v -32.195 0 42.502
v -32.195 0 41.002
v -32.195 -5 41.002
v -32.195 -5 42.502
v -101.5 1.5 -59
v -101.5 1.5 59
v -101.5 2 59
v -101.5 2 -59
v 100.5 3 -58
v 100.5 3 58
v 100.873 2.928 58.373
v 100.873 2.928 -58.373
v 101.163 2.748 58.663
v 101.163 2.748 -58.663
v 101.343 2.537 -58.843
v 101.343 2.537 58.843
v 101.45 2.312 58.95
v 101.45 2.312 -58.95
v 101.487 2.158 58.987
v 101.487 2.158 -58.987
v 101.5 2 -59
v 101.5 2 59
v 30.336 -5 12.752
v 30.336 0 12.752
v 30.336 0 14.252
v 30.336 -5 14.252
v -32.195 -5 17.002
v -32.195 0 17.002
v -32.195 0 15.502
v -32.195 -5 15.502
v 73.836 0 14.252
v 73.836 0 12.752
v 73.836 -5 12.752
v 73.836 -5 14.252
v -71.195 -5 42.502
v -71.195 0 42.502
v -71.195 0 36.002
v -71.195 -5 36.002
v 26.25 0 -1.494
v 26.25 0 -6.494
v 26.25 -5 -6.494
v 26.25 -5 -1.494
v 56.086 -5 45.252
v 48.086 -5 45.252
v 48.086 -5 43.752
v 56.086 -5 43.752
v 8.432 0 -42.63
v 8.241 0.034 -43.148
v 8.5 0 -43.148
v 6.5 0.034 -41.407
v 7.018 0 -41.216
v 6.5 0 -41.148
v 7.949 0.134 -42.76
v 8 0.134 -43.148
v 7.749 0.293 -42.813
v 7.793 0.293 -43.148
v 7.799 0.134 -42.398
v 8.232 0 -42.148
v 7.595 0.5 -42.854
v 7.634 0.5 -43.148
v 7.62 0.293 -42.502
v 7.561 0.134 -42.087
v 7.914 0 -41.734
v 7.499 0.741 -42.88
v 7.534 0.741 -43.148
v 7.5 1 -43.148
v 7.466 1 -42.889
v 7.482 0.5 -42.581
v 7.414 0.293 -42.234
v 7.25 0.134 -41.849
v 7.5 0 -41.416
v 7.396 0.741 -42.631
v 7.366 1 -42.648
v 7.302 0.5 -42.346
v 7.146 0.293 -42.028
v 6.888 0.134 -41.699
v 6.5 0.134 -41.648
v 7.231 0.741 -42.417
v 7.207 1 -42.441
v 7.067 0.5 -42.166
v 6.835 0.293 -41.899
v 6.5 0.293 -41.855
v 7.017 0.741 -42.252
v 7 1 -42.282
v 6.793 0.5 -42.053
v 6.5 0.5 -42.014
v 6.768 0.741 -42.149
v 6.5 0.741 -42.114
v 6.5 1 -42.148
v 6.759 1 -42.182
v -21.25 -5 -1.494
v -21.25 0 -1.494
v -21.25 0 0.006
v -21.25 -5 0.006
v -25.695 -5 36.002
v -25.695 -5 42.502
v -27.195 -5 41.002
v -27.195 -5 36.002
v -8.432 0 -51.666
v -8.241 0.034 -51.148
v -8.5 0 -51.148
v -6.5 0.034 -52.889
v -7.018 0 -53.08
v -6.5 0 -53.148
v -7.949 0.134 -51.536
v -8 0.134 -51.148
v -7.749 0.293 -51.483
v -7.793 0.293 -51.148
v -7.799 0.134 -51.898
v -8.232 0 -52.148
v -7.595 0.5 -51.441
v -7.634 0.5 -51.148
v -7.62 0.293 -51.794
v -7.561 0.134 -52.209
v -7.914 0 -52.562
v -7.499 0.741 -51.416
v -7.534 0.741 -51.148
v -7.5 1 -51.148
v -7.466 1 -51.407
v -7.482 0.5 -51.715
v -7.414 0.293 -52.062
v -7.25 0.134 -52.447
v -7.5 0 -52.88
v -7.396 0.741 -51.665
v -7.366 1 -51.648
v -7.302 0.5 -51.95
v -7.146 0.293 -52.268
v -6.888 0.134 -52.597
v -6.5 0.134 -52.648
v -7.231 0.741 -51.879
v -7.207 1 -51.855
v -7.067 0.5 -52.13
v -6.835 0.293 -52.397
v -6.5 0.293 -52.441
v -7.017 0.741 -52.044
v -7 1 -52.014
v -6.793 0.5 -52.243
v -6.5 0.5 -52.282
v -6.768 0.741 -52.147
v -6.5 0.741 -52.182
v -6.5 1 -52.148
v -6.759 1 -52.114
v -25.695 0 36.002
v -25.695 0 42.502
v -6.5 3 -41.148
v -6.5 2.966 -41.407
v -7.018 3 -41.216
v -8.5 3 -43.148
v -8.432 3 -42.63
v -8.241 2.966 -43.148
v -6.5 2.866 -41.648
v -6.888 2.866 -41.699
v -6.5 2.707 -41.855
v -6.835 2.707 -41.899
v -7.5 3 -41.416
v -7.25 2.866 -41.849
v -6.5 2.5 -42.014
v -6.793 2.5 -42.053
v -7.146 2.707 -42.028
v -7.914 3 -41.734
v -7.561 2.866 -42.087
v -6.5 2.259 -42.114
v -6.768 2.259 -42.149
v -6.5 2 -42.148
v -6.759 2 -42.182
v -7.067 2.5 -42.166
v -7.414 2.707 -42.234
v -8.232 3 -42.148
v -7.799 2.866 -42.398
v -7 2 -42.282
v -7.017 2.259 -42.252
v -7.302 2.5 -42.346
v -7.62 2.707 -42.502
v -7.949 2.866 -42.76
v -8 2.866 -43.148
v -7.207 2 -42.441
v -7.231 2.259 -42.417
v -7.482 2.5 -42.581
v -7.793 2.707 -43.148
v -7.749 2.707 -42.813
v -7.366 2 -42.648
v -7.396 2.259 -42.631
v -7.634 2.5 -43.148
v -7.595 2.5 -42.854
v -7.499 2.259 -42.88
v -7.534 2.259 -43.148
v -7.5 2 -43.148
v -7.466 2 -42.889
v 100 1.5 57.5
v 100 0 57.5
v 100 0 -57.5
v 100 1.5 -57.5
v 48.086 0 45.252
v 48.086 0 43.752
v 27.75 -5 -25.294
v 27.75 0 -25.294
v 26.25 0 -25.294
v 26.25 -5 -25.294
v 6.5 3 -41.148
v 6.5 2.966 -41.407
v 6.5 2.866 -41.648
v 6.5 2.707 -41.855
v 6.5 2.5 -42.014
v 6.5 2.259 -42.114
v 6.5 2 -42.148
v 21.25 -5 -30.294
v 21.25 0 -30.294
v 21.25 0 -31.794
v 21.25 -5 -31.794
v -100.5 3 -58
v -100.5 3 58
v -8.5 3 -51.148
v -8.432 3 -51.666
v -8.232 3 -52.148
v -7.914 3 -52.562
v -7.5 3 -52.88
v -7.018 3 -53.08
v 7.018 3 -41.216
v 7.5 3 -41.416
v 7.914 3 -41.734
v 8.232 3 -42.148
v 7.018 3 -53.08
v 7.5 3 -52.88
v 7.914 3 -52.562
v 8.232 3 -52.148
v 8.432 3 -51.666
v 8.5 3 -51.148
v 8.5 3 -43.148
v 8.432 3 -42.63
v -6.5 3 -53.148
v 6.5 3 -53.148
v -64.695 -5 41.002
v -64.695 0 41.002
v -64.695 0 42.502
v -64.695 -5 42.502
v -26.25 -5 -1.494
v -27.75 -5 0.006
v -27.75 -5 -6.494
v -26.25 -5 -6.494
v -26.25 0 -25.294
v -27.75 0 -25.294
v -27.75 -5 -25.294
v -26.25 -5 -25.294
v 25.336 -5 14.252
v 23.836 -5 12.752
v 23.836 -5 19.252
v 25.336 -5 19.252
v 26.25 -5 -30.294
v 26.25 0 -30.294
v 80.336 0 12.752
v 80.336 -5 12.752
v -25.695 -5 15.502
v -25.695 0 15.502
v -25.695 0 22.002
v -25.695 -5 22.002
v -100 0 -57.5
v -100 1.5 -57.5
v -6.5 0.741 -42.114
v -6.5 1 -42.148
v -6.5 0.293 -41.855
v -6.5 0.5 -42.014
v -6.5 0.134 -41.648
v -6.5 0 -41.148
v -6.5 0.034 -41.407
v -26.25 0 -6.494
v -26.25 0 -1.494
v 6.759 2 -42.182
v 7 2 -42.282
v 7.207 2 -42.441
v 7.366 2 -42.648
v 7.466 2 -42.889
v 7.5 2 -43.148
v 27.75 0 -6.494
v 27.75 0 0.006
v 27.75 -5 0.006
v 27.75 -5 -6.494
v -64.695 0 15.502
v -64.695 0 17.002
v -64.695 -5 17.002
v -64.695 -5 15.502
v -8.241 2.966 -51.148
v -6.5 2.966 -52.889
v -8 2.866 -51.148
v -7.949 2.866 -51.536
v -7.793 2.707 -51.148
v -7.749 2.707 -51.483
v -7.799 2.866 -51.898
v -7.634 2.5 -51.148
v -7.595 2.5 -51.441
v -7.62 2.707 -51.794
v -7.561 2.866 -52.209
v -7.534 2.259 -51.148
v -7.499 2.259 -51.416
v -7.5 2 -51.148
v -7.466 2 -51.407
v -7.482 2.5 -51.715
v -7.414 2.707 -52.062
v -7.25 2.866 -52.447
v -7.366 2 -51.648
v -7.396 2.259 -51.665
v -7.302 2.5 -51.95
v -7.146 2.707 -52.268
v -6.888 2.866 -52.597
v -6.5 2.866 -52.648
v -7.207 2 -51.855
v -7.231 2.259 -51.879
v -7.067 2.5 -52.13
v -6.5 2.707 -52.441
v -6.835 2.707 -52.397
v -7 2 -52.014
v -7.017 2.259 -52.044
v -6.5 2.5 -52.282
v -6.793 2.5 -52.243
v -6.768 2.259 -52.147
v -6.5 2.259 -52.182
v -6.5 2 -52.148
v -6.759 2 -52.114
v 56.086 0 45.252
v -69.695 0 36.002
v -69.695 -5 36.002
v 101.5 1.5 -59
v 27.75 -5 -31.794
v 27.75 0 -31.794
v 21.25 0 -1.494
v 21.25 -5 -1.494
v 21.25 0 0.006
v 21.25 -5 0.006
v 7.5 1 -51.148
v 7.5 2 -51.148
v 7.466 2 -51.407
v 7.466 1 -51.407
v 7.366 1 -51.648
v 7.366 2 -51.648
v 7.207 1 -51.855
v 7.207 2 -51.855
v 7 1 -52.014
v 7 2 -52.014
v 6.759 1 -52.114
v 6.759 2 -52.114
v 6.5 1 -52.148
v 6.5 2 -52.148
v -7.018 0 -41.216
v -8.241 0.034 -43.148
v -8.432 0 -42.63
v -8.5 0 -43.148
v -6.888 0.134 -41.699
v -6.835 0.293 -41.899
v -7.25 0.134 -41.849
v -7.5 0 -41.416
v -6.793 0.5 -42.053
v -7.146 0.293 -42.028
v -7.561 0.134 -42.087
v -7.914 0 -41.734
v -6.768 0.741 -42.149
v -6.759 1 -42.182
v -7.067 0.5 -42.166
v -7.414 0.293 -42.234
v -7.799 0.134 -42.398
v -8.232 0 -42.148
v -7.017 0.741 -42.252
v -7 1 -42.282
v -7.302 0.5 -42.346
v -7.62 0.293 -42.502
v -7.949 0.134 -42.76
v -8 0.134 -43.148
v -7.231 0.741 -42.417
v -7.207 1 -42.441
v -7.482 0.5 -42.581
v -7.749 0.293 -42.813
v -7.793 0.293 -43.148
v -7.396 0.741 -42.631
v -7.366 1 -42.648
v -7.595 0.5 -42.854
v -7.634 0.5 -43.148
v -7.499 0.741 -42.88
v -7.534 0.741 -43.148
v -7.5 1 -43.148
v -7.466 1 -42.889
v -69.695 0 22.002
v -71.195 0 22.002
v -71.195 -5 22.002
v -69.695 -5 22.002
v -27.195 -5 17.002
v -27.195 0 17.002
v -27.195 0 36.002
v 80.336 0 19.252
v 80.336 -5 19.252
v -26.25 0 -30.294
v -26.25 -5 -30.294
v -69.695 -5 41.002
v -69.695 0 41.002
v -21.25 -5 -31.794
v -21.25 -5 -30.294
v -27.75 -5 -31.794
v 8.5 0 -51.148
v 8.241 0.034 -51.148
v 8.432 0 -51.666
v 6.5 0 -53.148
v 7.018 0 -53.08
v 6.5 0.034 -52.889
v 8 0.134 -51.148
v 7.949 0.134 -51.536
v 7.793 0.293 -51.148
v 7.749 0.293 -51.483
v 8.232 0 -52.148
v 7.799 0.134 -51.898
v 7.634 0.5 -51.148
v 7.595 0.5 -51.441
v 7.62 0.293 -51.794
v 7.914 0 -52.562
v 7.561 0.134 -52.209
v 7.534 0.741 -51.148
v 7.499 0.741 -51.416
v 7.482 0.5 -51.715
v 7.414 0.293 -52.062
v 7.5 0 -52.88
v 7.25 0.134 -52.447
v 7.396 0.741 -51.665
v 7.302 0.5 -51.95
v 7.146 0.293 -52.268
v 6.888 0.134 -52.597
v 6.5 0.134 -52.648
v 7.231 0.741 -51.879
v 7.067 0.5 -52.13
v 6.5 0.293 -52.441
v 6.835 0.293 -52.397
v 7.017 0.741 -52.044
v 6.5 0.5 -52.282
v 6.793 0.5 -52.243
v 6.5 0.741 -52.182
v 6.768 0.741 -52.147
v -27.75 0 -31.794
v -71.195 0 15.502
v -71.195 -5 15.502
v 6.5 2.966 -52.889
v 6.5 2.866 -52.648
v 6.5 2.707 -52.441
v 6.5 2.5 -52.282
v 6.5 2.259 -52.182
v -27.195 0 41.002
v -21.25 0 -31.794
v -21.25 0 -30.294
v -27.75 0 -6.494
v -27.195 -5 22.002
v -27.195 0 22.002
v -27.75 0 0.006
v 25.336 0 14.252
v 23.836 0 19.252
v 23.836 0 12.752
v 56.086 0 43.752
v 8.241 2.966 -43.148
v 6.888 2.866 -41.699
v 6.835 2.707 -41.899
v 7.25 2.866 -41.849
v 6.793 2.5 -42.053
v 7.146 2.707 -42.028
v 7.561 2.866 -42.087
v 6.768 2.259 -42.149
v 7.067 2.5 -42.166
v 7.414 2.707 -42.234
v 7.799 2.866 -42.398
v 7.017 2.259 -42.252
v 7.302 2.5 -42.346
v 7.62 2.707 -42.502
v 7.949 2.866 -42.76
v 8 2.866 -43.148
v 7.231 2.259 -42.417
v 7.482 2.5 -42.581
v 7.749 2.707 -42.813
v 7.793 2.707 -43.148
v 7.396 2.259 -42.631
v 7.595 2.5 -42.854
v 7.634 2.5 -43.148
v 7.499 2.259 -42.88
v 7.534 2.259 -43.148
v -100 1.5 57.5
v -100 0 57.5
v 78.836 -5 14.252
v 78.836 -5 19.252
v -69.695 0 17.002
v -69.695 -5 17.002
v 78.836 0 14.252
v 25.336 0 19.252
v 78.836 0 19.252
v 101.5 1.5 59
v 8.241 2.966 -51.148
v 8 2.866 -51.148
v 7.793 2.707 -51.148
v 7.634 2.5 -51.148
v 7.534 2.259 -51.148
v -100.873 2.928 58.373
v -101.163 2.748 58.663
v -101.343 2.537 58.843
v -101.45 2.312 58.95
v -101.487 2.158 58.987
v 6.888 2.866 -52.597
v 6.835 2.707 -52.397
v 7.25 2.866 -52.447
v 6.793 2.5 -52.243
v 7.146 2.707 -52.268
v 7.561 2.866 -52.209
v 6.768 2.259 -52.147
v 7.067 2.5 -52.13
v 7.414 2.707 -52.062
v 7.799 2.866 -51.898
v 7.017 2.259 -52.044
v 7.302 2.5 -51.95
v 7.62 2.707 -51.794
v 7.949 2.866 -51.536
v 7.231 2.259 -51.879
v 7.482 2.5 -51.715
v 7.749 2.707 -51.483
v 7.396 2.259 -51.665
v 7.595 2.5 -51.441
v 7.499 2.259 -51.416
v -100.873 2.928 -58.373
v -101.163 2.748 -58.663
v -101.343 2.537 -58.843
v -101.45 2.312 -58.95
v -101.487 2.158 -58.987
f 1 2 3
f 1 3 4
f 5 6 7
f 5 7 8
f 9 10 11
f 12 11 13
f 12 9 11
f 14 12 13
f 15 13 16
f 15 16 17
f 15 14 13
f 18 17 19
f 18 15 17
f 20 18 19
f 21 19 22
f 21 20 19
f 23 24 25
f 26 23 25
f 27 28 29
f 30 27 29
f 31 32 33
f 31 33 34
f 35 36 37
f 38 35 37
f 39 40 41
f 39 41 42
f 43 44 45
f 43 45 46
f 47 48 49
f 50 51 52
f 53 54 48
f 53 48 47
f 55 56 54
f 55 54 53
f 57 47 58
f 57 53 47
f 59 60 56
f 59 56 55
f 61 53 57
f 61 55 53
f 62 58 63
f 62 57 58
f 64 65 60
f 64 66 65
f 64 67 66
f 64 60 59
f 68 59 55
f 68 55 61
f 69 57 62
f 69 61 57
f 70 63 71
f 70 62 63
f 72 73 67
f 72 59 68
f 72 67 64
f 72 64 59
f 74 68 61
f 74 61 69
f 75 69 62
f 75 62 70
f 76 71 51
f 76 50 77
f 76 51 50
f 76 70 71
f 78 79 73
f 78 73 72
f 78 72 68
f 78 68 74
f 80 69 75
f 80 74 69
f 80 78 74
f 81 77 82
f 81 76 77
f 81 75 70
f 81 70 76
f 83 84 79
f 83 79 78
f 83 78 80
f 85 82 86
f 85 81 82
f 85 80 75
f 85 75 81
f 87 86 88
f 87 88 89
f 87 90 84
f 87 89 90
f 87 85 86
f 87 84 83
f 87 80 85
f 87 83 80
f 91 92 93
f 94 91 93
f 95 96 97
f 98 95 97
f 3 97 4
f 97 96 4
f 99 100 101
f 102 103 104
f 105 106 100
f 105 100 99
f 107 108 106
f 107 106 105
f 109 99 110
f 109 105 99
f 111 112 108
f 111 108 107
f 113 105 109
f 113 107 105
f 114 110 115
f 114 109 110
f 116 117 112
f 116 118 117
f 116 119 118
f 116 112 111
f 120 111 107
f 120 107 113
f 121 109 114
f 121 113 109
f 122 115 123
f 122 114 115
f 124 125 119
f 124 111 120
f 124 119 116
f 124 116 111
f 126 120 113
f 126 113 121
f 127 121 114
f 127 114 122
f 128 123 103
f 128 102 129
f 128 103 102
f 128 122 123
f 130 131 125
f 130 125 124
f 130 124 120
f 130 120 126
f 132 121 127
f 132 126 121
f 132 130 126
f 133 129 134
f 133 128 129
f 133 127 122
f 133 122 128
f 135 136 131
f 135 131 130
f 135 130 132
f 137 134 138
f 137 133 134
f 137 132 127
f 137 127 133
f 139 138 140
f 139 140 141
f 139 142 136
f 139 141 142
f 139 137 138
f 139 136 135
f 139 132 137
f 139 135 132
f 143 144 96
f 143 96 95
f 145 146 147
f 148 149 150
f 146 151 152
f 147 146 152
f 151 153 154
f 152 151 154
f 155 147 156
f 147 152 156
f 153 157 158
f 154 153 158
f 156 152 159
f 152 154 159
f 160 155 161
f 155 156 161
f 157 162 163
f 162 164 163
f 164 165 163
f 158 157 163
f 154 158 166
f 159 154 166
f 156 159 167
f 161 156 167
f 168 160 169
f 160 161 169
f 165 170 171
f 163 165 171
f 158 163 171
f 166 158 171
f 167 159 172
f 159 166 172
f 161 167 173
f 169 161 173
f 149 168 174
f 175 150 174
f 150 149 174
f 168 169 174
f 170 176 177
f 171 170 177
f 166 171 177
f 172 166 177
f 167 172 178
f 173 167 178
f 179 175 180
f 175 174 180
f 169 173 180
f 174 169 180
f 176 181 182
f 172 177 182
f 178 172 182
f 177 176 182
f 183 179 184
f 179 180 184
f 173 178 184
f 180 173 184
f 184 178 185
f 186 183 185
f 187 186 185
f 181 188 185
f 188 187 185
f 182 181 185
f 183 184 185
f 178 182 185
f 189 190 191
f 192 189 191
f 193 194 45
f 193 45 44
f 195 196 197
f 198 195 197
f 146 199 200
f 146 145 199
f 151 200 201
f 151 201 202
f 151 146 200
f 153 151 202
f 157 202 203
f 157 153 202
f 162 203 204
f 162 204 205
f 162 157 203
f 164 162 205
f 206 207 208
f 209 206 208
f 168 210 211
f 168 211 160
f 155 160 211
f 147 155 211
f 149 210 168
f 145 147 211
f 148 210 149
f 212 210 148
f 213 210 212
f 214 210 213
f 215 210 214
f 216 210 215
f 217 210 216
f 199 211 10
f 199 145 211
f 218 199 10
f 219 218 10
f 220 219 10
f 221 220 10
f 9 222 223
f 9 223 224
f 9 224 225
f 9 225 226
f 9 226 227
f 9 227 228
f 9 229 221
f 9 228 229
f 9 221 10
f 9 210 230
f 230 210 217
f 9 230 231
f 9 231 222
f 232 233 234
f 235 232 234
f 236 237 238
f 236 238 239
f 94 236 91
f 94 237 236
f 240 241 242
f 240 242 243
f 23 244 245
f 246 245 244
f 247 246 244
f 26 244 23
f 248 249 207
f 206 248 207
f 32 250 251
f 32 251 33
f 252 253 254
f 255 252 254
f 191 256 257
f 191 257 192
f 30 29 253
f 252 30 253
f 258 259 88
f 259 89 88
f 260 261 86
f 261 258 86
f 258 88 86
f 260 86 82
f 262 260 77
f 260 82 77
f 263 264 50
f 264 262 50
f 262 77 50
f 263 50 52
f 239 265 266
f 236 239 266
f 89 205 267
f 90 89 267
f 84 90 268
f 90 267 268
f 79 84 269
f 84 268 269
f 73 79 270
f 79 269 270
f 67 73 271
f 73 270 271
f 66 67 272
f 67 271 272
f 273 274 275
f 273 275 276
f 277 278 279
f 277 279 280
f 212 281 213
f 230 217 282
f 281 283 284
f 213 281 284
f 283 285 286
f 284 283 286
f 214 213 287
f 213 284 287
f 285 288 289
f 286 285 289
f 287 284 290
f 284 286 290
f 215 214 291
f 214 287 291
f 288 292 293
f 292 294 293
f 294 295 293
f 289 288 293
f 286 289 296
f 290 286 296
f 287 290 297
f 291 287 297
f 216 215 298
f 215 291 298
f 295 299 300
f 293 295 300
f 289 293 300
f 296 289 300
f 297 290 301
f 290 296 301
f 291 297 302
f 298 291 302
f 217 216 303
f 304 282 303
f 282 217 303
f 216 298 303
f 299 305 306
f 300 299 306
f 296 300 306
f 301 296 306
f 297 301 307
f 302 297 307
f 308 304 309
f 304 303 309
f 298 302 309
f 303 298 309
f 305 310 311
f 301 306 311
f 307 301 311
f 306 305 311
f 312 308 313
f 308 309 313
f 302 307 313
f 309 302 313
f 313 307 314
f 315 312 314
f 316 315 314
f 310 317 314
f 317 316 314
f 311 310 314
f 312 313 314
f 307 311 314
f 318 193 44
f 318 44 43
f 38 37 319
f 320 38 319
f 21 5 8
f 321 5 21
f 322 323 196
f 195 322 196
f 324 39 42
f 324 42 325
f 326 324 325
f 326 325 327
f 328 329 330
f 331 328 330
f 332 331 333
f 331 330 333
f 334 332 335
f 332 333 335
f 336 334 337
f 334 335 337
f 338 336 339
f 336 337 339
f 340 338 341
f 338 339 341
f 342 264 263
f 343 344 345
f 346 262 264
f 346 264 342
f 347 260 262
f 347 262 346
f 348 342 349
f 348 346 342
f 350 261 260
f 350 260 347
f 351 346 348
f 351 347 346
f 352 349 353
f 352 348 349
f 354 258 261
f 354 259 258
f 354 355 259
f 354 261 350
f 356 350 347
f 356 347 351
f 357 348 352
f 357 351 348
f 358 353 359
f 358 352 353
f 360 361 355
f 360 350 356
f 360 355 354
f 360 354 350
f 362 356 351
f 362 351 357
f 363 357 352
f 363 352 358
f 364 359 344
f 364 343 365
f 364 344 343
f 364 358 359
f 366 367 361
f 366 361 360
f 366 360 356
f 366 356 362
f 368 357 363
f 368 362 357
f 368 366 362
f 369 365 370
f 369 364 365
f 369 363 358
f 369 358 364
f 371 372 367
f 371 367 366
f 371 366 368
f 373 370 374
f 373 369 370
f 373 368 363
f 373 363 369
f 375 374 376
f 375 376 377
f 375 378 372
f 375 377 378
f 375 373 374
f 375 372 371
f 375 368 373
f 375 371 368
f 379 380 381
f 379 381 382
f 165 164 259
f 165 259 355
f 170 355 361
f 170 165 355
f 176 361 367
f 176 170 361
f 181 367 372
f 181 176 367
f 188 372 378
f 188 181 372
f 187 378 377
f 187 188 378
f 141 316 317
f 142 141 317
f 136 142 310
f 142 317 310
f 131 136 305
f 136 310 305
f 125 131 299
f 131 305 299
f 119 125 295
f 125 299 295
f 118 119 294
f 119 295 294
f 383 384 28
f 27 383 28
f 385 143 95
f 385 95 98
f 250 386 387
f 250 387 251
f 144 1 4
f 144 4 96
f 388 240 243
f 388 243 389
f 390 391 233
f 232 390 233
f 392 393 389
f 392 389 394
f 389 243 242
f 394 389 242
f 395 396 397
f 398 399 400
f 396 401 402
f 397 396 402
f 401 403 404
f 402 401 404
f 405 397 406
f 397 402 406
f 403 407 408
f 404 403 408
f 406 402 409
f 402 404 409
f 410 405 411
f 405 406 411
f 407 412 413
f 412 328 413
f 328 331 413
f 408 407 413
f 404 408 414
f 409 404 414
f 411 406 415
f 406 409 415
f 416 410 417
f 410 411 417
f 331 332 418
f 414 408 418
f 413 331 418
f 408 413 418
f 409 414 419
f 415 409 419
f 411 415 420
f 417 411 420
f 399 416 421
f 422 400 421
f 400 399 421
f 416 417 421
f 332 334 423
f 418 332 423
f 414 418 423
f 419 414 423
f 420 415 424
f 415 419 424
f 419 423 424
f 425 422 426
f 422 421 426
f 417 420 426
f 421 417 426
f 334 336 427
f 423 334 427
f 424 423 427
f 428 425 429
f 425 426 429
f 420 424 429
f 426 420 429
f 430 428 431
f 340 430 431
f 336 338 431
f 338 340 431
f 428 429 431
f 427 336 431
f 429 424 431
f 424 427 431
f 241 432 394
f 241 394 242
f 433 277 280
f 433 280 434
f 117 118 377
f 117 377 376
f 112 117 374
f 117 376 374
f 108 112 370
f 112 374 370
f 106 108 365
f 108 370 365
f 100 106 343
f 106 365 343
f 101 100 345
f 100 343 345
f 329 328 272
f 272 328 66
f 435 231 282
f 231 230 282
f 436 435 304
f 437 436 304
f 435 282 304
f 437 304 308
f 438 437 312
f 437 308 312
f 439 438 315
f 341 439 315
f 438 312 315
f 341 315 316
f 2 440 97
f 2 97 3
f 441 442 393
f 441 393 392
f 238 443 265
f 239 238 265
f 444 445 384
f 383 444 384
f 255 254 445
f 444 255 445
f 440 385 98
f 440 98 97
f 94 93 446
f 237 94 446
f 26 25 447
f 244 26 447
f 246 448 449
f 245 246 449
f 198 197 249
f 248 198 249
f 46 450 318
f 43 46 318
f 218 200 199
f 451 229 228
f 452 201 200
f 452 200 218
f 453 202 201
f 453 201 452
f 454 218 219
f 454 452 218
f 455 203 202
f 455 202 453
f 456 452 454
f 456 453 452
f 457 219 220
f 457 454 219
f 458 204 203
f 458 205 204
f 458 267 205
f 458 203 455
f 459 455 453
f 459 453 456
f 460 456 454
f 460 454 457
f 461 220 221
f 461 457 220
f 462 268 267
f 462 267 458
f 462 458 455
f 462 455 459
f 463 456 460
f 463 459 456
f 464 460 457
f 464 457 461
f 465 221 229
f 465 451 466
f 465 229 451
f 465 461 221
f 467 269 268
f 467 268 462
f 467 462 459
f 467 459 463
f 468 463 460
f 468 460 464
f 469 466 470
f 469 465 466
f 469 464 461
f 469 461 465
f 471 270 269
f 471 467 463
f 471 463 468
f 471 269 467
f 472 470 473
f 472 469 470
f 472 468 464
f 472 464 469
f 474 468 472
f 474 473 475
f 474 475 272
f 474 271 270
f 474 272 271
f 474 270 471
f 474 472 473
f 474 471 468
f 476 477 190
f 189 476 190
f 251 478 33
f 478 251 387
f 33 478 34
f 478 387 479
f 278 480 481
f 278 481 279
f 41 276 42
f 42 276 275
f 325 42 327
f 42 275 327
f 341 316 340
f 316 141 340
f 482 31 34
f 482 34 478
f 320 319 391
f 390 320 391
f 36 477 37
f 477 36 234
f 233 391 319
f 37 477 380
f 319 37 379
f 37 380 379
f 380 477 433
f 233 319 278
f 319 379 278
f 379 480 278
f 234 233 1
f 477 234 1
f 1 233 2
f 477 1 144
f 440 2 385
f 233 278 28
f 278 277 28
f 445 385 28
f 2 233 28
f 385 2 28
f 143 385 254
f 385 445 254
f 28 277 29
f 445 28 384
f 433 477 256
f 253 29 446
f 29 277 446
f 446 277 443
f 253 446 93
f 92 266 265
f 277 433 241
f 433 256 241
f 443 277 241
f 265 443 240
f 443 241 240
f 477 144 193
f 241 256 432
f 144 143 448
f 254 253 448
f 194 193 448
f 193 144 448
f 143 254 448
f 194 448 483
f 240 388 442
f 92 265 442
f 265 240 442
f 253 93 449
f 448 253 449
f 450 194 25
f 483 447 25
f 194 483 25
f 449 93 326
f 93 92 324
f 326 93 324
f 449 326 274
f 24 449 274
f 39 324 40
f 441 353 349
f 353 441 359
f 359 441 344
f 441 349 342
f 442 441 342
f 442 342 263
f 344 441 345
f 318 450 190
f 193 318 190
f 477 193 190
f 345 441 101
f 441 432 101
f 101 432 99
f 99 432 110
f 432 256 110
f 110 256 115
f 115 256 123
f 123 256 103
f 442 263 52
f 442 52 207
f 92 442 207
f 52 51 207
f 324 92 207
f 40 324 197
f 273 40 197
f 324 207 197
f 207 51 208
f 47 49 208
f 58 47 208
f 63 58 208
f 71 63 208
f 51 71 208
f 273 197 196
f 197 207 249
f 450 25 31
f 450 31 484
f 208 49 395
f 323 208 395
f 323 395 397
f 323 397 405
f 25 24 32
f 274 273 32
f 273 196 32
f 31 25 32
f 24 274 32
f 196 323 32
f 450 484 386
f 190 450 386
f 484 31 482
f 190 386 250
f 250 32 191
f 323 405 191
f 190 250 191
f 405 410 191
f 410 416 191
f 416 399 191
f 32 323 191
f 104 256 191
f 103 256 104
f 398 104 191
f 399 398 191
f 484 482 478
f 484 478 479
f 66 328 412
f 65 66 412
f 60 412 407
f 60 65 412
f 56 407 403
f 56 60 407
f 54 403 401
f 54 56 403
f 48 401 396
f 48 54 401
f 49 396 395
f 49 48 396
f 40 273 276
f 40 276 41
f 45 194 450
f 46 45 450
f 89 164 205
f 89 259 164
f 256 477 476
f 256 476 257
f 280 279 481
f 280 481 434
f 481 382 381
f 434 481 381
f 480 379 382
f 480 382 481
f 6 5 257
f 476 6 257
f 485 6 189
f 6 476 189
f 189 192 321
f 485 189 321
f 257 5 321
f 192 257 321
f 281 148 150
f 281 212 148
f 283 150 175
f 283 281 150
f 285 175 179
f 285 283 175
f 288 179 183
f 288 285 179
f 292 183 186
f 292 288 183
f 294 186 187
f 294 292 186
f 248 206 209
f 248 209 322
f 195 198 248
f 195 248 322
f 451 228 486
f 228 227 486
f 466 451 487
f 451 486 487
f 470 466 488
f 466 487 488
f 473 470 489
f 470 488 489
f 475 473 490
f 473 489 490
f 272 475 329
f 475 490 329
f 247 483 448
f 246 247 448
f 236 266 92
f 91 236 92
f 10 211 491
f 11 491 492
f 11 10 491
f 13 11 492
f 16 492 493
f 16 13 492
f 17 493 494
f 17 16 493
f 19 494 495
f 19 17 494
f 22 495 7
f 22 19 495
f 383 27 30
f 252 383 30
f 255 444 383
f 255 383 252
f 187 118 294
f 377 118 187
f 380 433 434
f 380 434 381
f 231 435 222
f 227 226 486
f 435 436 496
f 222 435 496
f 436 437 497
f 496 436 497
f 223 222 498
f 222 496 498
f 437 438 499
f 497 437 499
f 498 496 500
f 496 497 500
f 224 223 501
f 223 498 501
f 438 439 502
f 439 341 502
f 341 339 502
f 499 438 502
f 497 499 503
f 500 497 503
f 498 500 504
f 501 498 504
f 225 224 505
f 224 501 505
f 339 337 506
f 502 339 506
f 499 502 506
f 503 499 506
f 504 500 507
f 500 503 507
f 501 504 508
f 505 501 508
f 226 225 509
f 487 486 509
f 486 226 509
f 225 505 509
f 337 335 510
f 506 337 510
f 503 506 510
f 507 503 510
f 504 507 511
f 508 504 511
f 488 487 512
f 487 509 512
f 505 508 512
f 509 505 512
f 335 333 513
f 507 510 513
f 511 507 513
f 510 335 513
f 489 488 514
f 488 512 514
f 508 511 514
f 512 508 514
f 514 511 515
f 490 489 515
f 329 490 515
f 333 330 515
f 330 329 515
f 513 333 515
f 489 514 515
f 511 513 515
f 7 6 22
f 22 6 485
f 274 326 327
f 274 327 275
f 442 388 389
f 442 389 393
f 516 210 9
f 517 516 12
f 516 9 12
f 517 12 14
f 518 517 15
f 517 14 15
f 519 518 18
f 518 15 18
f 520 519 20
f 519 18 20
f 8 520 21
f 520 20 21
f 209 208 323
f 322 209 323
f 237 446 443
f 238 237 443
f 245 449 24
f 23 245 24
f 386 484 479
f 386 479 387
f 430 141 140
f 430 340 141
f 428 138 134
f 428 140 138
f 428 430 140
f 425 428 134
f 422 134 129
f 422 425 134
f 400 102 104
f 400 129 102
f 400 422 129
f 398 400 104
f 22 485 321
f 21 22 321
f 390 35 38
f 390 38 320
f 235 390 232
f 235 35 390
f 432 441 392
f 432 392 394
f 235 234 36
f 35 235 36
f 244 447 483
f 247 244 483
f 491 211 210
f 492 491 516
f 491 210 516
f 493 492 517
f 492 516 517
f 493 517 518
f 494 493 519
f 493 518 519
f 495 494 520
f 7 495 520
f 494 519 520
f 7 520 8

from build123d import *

# Parameters (mm, degrees)
SKETCH_1_W          = 200
SKETCH_1_H          = 115
EXTRUDE_1_DEPTH     = 1.5
SKETCH_2_W          = 203
SKETCH_2_H          = 118
EXTRUDE_2_DEPTH     = 1.5
SKETCH_3_W          = 15
SKETCH_3_H          = 10
CUT_EXTRUDE_1_DEPTH = 11.5
FILLET_2_R          = 1
FILLET_3_R          = 1
SKETCH_4_W          = 8
SKETCH_4_H          = 1.5
EXTRUDE_3_DEPTH     = 5


with BuildPart() as part:
    # 草图1 → 凸台-拉伸1 (new body)
    with BuildSketch(Plane(origin=(0, 0, 0), x_dir=(1, 0, 0), z_dir=(0, 1, 0))):
        Rectangle(SKETCH_1_W, SKETCH_1_H)
    extrude(amount=EXTRUDE_1_DEPTH)

    # 草图2 → 凸台-拉伸2 (add)
    with BuildSketch(Plane(origin=(0, 1.5, 0), x_dir=(1, 0, 0), z_dir=(0, 1, 0))):
        Rectangle(SKETCH_2_W, SKETCH_2_H)
    extrude(amount=EXTRUDE_2_DEPTH)

    # 草图3 → 切除-拉伸1 (cut)
    with BuildSketch(Plane.XZ):
        with Locations((0, -47.14798892)):
            Rectangle(SKETCH_3_W, SKETCH_3_H)
    extrude(amount=-CUT_EXTRUDE_1_DEPTH, mode=Mode.SUBTRACT)

    # 圆角2
    fillet_2_edges = [part.edges().sort_by_distance(p)[0] for p in [
        (0, 3, -42.14798892),
        (-7.5, 3, -47.14798892),
        (0, 3, -52.14798892),
        (7.5, 3, -47.14798892),
        (7.5, 1.5, -42.14798892),
        (7.5, 1.5, -52.14798892),
        (-7.5, 1.5, -52.14798892),
        (-7.5, 1.5, -42.14798892),
        (7.5, 0, -47.14798892),
        (0, 0, -42.14798892),
        (-7.5, 0, -47.14798892),
        (0, 0, -52.14798892),
    ]]
    fillet(fillet_2_edges, radius=FILLET_2_R)

    # 圆角3
    fillet_3_edges = [part.edges().sort_by_distance(p)[0] for p in [
        (101.5, 3, 0),
        (0, 3, -59),
        (-101.5, 3, 0),
        (0, 3, 59),
    ]]
    fillet(fillet_3_edges, radius=FILLET_3_R)

    # 草图4 → 凸台-拉伸3 (add)
    with BuildSketch(Plane.XZ):
        Polygon((-64.695285942, 41.001921469), (-64.695285942, 42.501921469), (-71.195285942, 42.501921469), (-71.195285942, 36.001921469), (-69.695285942, 36.001921469), (-69.695285942, 41.001921469), align=None)
        Polygon((-21.25, -1.493976955), (-21.25, 0.006023045), (-27.75, 0.006023045), (-27.75, -6.493976955), (-26.25, -6.493976955), (-26.25, -1.493976955), align=None)
        Polygon((-32.195285942, 41.001921469), (-32.195285942, 42.501921469), (-25.695285942, 42.501921469), (-25.695285942, 36.001921469), (-27.195285942, 36.001921469), (-27.195285942, 41.001921469), align=None)
        Polygon((-25.695285942, 22.001921469), (-27.195285942, 22.001921469), (-27.195285942, 17.001921469), (-32.195285942, 17.001921469), (-32.195285942, 15.501921469), (-25.695285942, 15.501921469), align=None)
        Polygon((-71.195285942, 22.001921469), (-69.695285942, 22.001921469), (-69.695285942, 17.001921469), (-64.695285942, 17.001921469), (-64.695285942, 15.501921469), (-71.195285942, 15.501921469), align=None)
        Polygon((27.75, -6.493976955), (26.25, -6.493976955), (26.25, -1.493976955), (21.25, -1.493976955), (21.25, 0.006023045), (27.75, 0.006023045), align=None)
        Polygon((-26.25, -30.293976955), (-21.25, -30.293976955), (-21.25, -31.793976955), (-27.75, -31.793976955), (-27.75, -25.293976955), (-26.25, -25.293976955), align=None)
        Polygon((21.25, -30.293976955), (21.25, -31.793976955), (27.75, -31.793976955), (27.75, -25.293976955), (26.25, -25.293976955), (26.25, -30.293976955), align=None)
        with Locations((52.085748654, 44.501921469)):
            Rectangle(SKETCH_4_W, SKETCH_4_H)
        Polygon((25.335748654, 19.251921469), (23.835748654, 19.251921469), (23.835748654, 12.751921469), (30.335748654, 12.751921469), (30.335748654, 14.251921469), (25.335748654, 14.251921469), align=None)
        Polygon((73.835748654, 12.751921469), (73.835748654, 14.251921469), (78.835748654, 14.251921469), (78.835748654, 19.251921469), (80.335748654, 19.251921469), (80.335748654, 12.751921469), align=None)
    extrude(amount=EXTRUDE_3_DEPTH)


solid = part.part
